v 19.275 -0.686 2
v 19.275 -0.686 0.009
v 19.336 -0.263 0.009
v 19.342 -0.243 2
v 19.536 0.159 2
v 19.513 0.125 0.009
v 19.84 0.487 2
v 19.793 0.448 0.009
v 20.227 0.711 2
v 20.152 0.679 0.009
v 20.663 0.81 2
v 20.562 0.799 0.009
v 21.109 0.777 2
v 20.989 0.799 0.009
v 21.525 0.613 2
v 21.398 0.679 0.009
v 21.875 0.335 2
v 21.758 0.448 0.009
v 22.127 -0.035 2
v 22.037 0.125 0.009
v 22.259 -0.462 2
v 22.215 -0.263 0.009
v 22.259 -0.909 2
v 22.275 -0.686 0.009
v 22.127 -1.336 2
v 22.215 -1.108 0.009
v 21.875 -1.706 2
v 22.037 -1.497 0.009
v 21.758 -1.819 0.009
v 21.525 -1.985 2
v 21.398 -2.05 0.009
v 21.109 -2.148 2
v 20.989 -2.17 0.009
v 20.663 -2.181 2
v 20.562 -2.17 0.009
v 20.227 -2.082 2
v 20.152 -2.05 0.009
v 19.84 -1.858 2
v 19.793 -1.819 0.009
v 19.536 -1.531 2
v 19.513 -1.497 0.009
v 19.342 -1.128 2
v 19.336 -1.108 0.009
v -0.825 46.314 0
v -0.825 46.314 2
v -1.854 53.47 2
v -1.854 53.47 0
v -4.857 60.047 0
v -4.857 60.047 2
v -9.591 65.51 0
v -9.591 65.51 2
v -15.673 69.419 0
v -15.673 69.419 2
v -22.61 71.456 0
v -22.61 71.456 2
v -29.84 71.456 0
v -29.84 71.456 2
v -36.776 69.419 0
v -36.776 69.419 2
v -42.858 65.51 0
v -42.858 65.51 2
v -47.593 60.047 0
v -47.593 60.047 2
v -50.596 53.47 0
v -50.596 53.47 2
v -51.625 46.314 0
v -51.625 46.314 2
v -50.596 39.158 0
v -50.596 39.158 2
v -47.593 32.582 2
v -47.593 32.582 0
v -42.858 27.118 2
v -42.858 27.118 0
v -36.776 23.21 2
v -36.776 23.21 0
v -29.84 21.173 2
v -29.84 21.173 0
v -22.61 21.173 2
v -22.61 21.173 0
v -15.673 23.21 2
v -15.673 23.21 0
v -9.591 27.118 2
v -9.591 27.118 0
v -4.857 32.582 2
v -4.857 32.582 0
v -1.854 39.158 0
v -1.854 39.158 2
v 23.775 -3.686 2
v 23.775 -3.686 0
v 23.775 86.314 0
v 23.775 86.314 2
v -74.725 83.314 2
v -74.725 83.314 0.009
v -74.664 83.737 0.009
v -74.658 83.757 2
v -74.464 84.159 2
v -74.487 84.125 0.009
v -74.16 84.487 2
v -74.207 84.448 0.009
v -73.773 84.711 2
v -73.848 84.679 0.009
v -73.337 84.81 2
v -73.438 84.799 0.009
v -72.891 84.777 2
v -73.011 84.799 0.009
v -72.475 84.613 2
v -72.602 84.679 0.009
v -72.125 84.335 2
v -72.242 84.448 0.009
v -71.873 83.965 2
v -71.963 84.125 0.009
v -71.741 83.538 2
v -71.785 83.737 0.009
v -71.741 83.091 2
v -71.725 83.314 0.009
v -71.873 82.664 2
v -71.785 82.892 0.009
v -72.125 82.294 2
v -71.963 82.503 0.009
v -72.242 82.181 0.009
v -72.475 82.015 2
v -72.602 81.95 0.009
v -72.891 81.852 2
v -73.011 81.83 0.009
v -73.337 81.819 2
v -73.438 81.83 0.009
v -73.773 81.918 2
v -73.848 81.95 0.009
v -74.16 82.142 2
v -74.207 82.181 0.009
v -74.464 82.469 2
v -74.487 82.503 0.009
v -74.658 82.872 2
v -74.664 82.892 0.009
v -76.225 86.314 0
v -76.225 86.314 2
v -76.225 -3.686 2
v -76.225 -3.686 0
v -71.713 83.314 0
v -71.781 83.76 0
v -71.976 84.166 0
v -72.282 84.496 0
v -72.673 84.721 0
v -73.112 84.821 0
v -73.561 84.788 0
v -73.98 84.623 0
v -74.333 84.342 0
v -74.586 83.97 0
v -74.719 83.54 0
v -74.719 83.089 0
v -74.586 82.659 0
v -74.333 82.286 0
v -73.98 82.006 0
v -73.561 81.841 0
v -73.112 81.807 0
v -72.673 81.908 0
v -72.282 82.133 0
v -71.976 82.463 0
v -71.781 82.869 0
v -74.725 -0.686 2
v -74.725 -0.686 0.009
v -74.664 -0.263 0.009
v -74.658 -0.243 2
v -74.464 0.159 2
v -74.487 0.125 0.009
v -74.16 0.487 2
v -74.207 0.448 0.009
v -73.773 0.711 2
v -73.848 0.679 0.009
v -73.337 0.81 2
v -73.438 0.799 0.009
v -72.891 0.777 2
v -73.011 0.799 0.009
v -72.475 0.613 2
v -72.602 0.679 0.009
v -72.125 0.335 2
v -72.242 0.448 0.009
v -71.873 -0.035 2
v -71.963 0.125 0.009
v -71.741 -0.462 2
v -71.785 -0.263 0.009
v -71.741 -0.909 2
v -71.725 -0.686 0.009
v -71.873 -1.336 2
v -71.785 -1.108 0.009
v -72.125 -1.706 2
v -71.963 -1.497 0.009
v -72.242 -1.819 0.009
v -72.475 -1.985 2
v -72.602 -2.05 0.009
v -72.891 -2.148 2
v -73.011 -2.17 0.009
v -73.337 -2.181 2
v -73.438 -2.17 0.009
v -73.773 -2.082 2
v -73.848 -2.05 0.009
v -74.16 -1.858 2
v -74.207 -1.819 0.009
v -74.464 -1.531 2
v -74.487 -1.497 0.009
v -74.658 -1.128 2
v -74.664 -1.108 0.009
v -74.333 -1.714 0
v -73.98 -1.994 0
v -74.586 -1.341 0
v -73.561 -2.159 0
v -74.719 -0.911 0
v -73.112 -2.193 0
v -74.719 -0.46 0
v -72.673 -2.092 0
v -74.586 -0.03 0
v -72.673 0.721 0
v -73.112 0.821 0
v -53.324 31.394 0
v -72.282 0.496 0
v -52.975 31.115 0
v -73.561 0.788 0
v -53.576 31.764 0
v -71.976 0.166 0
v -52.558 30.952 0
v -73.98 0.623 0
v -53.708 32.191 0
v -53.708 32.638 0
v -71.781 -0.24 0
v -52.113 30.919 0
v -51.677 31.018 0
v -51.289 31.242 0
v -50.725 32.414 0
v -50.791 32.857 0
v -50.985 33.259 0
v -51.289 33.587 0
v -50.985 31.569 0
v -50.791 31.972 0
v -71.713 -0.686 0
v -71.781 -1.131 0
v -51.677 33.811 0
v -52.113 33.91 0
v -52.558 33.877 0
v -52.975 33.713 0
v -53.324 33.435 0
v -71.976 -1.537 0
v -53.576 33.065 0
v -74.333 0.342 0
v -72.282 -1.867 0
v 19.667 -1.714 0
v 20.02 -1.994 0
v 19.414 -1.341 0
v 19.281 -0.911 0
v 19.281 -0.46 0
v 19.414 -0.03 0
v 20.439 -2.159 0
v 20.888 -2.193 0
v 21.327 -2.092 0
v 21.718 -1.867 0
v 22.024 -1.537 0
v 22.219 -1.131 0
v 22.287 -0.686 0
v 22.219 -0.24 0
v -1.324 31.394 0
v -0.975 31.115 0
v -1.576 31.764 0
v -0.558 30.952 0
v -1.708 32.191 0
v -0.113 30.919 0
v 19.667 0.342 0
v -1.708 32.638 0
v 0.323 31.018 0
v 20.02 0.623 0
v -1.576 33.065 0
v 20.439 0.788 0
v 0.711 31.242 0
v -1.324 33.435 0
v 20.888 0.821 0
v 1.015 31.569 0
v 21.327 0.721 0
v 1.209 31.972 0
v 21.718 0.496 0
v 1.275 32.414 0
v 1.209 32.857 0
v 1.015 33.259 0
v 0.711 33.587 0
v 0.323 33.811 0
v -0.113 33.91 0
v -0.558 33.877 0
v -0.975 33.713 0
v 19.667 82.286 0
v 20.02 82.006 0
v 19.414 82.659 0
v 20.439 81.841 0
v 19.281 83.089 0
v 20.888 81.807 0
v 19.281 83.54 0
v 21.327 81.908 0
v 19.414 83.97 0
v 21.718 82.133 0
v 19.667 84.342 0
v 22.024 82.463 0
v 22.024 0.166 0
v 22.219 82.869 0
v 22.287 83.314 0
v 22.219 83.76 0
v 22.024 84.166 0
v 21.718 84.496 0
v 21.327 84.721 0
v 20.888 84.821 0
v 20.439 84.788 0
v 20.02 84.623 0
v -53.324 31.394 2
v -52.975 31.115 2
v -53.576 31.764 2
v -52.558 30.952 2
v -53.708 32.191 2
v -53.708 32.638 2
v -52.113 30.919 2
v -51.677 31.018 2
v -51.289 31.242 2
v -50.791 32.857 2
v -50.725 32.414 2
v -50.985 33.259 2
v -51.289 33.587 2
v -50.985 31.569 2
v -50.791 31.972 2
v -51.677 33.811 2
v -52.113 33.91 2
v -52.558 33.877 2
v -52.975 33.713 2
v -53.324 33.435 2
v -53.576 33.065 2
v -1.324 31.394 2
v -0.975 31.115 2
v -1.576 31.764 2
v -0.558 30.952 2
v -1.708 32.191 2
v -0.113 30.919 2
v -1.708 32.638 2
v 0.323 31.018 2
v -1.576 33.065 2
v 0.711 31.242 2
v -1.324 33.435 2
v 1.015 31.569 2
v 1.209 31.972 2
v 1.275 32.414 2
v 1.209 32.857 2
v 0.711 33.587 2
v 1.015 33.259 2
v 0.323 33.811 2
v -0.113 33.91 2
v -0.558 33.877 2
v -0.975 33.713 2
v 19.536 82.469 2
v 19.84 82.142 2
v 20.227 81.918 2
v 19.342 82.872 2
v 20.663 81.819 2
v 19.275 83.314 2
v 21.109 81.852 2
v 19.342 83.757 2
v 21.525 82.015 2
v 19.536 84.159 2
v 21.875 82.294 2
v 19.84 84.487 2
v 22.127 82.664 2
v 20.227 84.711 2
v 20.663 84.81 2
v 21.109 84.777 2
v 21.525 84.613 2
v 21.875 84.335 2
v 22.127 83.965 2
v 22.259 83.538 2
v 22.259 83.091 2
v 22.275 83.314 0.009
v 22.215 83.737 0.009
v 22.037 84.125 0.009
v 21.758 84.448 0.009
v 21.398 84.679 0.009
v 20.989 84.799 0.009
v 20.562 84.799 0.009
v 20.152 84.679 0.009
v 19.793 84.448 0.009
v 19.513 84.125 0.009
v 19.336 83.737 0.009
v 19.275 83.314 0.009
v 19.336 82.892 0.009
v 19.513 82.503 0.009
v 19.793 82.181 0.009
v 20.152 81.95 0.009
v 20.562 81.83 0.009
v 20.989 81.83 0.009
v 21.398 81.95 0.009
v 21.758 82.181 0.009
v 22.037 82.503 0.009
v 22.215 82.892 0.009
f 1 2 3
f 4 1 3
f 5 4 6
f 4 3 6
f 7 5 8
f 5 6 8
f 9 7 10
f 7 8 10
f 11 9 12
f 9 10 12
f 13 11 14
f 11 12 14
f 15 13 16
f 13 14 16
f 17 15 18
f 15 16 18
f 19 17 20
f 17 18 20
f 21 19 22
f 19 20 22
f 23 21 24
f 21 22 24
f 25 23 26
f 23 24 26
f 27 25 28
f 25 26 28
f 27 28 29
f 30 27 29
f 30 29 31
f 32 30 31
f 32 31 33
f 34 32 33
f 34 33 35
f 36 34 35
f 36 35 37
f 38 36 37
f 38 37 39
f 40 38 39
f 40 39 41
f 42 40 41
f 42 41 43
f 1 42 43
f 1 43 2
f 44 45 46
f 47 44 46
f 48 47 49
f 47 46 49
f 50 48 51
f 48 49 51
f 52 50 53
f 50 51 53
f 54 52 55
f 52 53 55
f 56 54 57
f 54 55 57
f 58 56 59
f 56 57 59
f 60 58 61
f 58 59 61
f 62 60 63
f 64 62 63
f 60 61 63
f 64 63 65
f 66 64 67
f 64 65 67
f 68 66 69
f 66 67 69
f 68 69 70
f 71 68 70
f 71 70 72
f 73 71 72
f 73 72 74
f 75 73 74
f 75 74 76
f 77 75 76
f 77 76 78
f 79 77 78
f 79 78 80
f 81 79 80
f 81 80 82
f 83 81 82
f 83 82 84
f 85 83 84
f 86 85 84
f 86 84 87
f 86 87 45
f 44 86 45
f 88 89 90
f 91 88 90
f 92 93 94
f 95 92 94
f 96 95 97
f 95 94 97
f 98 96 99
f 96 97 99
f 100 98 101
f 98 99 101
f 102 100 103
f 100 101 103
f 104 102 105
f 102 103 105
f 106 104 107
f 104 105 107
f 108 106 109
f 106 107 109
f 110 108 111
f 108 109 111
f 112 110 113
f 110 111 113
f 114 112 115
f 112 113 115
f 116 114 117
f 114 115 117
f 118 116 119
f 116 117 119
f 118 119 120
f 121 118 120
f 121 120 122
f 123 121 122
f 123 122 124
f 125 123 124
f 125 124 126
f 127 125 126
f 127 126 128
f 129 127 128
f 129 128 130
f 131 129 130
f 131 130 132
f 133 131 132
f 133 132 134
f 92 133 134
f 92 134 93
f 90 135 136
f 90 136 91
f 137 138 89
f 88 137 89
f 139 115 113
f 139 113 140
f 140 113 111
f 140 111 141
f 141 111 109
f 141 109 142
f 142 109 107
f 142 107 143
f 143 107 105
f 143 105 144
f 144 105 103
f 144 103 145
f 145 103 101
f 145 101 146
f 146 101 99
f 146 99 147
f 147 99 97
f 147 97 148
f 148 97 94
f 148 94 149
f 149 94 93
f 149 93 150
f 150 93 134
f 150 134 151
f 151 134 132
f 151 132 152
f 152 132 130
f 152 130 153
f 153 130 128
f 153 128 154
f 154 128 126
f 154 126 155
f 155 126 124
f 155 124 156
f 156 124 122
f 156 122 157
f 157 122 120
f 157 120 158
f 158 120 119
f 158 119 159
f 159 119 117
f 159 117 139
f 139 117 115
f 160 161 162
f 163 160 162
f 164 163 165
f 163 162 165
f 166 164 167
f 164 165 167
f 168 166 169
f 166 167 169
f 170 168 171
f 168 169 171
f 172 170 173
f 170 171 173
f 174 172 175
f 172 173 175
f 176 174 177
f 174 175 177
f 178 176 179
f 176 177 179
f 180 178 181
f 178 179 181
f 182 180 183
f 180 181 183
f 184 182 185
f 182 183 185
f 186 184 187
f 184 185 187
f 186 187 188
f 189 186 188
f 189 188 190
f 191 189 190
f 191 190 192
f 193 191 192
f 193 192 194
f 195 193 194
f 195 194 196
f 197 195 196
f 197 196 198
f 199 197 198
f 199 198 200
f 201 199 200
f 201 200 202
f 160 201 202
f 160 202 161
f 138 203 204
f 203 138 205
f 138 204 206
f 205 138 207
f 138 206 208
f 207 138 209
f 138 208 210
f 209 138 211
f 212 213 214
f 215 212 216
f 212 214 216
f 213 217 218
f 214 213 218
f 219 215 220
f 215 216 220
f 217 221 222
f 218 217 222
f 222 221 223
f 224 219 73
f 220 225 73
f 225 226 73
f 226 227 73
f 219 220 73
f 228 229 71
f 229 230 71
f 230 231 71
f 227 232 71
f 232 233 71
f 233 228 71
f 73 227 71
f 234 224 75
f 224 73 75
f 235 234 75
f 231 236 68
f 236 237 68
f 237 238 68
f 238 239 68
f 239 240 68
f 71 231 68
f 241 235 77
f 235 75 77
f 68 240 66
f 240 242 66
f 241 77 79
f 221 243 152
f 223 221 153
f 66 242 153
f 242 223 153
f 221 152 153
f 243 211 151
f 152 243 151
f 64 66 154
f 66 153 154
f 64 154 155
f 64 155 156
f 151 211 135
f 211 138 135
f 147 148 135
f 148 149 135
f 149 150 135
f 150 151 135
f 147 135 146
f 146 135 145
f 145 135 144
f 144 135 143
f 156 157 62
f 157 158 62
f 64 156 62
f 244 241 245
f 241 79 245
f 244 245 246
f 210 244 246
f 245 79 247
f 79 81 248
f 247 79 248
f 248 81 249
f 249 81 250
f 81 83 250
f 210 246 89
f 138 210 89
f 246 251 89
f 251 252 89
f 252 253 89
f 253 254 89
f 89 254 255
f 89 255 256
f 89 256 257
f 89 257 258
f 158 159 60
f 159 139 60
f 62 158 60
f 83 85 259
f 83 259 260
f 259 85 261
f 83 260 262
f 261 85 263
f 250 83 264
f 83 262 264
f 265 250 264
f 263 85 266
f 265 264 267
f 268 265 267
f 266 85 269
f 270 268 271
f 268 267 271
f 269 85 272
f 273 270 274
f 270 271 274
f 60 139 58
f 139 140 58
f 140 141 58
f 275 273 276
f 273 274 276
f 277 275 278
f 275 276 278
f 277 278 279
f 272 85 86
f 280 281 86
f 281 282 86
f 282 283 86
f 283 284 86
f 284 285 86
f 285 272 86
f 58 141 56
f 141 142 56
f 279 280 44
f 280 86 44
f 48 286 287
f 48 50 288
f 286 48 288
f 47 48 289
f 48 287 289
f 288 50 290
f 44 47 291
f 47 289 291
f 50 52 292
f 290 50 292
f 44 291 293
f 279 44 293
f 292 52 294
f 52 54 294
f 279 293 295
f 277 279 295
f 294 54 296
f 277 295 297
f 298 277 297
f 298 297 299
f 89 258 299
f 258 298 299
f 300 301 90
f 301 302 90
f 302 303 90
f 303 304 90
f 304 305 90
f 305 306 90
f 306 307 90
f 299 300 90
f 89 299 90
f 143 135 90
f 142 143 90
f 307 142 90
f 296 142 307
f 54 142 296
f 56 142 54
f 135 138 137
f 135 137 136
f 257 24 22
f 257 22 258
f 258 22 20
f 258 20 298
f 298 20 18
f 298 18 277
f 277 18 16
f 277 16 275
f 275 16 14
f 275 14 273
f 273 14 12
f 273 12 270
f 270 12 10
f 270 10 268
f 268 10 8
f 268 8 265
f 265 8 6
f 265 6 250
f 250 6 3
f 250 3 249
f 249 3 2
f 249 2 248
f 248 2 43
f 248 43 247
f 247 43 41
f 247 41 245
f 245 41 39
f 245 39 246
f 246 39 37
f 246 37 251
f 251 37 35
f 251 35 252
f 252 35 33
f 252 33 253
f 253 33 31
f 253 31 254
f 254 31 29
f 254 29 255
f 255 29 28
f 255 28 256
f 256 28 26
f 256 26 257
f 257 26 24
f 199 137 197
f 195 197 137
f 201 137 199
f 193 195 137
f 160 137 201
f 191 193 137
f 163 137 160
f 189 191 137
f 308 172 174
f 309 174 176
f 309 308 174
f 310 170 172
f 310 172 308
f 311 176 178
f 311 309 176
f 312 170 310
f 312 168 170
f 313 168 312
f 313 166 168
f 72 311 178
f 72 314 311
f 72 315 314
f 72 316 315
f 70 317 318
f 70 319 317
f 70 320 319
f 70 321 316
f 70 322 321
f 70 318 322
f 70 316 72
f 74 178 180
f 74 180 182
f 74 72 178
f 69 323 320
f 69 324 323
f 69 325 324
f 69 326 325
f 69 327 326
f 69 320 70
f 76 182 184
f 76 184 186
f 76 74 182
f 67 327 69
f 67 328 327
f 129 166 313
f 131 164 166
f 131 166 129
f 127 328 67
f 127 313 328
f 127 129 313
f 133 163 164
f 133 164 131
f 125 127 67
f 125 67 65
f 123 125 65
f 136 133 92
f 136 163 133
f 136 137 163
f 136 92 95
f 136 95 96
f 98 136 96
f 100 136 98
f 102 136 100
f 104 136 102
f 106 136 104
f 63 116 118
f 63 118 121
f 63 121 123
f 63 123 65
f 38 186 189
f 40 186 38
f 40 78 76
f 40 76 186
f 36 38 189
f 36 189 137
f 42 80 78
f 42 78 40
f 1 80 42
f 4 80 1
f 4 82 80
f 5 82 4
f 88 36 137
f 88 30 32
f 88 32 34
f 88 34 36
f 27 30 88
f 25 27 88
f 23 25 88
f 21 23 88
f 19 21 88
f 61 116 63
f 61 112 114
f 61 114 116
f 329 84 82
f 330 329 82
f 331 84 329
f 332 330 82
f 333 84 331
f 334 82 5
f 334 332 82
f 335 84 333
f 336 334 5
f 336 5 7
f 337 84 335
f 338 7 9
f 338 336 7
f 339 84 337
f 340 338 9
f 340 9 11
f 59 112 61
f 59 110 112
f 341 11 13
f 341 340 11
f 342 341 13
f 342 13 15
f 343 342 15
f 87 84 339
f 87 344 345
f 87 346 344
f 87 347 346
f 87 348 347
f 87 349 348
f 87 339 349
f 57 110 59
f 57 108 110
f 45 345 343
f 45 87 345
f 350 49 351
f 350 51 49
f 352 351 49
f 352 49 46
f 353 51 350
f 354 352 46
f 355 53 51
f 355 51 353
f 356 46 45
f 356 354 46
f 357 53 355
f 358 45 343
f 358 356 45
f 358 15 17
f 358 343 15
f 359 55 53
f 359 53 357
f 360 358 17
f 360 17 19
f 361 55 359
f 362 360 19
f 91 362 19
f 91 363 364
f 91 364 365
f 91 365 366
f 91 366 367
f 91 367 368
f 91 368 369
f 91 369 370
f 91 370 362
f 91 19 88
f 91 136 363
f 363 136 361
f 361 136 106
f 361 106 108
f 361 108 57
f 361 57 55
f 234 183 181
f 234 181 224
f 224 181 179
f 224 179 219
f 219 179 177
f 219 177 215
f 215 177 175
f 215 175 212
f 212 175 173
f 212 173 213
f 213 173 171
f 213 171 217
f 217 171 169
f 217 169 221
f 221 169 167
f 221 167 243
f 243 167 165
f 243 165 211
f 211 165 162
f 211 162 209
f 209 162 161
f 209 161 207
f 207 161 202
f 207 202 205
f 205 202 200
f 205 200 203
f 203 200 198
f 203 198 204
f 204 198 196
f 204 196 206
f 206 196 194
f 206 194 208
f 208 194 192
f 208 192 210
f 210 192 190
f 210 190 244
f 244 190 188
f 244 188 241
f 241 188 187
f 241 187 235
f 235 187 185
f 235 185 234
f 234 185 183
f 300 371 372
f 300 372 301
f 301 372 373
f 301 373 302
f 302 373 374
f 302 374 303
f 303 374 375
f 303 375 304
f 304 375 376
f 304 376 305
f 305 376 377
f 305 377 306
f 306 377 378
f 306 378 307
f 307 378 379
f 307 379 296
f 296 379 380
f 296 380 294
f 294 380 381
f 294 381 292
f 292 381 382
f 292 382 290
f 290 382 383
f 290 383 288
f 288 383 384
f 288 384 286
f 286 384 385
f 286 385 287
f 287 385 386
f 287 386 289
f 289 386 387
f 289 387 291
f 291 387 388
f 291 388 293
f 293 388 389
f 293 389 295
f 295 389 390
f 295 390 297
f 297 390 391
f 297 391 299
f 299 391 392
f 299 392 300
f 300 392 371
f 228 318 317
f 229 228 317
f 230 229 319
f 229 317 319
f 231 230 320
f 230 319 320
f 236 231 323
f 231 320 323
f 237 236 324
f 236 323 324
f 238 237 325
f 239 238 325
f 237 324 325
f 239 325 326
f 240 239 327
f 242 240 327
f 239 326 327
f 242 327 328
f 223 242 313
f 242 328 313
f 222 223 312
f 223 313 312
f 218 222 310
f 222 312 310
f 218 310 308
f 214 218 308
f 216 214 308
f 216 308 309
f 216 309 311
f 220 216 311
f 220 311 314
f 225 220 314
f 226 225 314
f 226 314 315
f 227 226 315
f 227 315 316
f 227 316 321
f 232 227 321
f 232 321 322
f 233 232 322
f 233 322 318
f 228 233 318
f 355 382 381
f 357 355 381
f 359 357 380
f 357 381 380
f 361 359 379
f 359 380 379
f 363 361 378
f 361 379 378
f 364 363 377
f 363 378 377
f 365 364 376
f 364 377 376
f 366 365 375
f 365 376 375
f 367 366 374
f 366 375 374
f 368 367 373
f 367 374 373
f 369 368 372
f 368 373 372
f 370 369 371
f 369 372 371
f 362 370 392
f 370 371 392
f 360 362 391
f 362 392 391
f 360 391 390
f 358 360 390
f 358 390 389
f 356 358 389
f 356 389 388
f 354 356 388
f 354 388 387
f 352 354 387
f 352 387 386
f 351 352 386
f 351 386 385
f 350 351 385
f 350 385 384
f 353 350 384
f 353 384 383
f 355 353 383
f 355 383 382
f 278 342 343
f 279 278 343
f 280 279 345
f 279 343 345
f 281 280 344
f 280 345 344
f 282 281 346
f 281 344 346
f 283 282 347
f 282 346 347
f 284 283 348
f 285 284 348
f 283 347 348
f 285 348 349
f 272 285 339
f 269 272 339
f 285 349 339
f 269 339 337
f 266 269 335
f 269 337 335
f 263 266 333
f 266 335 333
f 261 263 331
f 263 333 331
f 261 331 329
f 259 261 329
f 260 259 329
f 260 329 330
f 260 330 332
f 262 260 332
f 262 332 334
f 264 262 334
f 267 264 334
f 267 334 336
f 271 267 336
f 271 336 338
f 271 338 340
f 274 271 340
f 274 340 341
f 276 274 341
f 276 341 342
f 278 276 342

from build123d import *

# Parameters (mm, degrees)
SKETCH1_W                                         = 100
SKETCH1_H                                         = 90
BOSS_EXTRUDE1_DEPTH                               = 2
SKETCH2_R                                         = 25.4
CUT_EXTRUDE1_DEPTH                                = 3
SKETCH3_R                                         = 1.5
CUT_EXTRUDE2_DEPTH                                = 3
SKETCH4_R                                         = 1.5
CUT_EXTRUDE3_DEPTH                                = 10
CSK_FOR_0_FLAT_HEAD_MACHINE_SCREW_100_D           = 1.778
CSK_FOR_0_FLAT_HEAD_MACHINE_SCREW_100_CSINK_D     = 3.0226
CSK_FOR_0_FLAT_HEAD_MACHINE_SCREW_100_CSINK_ANGLE = 100


with BuildPart() as part:
    # Sketch1 → Boss-Extrude1 (new body)
    with BuildSketch(Plane.XY):
        with Locations((-26.224709151, 41.314420924)):
            Rectangle(SKETCH1_W, SKETCH1_H)
    extrude(amount=BOSS_EXTRUDE1_DEPTH)

    # Sketch2 → Cut-Extrude1 (cut)
    with BuildSketch(Plane.XY.offset(2)):
        with Locations((-26.224709151, 46.314420924)):
            Circle(SKETCH2_R)
    extrude(amount=-CUT_EXTRUDE1_DEPTH, mode=Mode.SUBTRACT)

    # Sketch3 → Cut-Extrude2 (cut)
    with BuildSketch(Plane.XY.offset(2)):
        with Locations((-52.224709151, 32.414420924)):
            Circle(SKETCH3_R)
        with Locations((-0.224709151, 32.414420924)):
            Circle(SKETCH3_R)
    extrude(amount=-CUT_EXTRUDE2_DEPTH, mode=Mode.SUBTRACT)

    # Sketch4 → Cut-Extrude3 (cut)
    with BuildSketch(Plane(origin=(0, 0, 0), x_dir=(-1, 0, 0), z_dir=(0, 0, -1))):
        with Locations((-20.775290849, 83.314420924)):
            Circle(SKETCH4_R)
        with Locations((73.224709151, 83.314420924)):
            Circle(SKETCH4_R)
        with Locations((73.224709151, -0.685579076)):
            Circle(SKETCH4_R)
        with Locations((-20.775290849, -0.685579076)):
            Circle(SKETCH4_R)
    extrude(amount=-CUT_EXTRUDE3_DEPTH, mode=Mode.SUBTRACT)

    # CSK for #0 Flat Head Machine Screw (100)2 (through all)
    with Locations(Plane(origin=(0, 0, 0), x_dir=(-1, 0, 0), z_dir=(0, 0, -1))):
        with Locations((-20.775290849, 83.314420924), (73.224709151, 83.314420924), (73.224709151, -0.685579076), (-20.775290849, -0.685579076)):
            CounterSinkHole(CSK_FOR_0_FLAT_HEAD_MACHINE_SCREW_100_D / 2, CSK_FOR_0_FLAT_HEAD_MACHINE_SCREW_100_CSINK_D / 2, counter_sink_angle=CSK_FOR_0_FLAT_HEAD_MACHINE_SCREW_100_CSINK_ANGLE)


solid = part.part
